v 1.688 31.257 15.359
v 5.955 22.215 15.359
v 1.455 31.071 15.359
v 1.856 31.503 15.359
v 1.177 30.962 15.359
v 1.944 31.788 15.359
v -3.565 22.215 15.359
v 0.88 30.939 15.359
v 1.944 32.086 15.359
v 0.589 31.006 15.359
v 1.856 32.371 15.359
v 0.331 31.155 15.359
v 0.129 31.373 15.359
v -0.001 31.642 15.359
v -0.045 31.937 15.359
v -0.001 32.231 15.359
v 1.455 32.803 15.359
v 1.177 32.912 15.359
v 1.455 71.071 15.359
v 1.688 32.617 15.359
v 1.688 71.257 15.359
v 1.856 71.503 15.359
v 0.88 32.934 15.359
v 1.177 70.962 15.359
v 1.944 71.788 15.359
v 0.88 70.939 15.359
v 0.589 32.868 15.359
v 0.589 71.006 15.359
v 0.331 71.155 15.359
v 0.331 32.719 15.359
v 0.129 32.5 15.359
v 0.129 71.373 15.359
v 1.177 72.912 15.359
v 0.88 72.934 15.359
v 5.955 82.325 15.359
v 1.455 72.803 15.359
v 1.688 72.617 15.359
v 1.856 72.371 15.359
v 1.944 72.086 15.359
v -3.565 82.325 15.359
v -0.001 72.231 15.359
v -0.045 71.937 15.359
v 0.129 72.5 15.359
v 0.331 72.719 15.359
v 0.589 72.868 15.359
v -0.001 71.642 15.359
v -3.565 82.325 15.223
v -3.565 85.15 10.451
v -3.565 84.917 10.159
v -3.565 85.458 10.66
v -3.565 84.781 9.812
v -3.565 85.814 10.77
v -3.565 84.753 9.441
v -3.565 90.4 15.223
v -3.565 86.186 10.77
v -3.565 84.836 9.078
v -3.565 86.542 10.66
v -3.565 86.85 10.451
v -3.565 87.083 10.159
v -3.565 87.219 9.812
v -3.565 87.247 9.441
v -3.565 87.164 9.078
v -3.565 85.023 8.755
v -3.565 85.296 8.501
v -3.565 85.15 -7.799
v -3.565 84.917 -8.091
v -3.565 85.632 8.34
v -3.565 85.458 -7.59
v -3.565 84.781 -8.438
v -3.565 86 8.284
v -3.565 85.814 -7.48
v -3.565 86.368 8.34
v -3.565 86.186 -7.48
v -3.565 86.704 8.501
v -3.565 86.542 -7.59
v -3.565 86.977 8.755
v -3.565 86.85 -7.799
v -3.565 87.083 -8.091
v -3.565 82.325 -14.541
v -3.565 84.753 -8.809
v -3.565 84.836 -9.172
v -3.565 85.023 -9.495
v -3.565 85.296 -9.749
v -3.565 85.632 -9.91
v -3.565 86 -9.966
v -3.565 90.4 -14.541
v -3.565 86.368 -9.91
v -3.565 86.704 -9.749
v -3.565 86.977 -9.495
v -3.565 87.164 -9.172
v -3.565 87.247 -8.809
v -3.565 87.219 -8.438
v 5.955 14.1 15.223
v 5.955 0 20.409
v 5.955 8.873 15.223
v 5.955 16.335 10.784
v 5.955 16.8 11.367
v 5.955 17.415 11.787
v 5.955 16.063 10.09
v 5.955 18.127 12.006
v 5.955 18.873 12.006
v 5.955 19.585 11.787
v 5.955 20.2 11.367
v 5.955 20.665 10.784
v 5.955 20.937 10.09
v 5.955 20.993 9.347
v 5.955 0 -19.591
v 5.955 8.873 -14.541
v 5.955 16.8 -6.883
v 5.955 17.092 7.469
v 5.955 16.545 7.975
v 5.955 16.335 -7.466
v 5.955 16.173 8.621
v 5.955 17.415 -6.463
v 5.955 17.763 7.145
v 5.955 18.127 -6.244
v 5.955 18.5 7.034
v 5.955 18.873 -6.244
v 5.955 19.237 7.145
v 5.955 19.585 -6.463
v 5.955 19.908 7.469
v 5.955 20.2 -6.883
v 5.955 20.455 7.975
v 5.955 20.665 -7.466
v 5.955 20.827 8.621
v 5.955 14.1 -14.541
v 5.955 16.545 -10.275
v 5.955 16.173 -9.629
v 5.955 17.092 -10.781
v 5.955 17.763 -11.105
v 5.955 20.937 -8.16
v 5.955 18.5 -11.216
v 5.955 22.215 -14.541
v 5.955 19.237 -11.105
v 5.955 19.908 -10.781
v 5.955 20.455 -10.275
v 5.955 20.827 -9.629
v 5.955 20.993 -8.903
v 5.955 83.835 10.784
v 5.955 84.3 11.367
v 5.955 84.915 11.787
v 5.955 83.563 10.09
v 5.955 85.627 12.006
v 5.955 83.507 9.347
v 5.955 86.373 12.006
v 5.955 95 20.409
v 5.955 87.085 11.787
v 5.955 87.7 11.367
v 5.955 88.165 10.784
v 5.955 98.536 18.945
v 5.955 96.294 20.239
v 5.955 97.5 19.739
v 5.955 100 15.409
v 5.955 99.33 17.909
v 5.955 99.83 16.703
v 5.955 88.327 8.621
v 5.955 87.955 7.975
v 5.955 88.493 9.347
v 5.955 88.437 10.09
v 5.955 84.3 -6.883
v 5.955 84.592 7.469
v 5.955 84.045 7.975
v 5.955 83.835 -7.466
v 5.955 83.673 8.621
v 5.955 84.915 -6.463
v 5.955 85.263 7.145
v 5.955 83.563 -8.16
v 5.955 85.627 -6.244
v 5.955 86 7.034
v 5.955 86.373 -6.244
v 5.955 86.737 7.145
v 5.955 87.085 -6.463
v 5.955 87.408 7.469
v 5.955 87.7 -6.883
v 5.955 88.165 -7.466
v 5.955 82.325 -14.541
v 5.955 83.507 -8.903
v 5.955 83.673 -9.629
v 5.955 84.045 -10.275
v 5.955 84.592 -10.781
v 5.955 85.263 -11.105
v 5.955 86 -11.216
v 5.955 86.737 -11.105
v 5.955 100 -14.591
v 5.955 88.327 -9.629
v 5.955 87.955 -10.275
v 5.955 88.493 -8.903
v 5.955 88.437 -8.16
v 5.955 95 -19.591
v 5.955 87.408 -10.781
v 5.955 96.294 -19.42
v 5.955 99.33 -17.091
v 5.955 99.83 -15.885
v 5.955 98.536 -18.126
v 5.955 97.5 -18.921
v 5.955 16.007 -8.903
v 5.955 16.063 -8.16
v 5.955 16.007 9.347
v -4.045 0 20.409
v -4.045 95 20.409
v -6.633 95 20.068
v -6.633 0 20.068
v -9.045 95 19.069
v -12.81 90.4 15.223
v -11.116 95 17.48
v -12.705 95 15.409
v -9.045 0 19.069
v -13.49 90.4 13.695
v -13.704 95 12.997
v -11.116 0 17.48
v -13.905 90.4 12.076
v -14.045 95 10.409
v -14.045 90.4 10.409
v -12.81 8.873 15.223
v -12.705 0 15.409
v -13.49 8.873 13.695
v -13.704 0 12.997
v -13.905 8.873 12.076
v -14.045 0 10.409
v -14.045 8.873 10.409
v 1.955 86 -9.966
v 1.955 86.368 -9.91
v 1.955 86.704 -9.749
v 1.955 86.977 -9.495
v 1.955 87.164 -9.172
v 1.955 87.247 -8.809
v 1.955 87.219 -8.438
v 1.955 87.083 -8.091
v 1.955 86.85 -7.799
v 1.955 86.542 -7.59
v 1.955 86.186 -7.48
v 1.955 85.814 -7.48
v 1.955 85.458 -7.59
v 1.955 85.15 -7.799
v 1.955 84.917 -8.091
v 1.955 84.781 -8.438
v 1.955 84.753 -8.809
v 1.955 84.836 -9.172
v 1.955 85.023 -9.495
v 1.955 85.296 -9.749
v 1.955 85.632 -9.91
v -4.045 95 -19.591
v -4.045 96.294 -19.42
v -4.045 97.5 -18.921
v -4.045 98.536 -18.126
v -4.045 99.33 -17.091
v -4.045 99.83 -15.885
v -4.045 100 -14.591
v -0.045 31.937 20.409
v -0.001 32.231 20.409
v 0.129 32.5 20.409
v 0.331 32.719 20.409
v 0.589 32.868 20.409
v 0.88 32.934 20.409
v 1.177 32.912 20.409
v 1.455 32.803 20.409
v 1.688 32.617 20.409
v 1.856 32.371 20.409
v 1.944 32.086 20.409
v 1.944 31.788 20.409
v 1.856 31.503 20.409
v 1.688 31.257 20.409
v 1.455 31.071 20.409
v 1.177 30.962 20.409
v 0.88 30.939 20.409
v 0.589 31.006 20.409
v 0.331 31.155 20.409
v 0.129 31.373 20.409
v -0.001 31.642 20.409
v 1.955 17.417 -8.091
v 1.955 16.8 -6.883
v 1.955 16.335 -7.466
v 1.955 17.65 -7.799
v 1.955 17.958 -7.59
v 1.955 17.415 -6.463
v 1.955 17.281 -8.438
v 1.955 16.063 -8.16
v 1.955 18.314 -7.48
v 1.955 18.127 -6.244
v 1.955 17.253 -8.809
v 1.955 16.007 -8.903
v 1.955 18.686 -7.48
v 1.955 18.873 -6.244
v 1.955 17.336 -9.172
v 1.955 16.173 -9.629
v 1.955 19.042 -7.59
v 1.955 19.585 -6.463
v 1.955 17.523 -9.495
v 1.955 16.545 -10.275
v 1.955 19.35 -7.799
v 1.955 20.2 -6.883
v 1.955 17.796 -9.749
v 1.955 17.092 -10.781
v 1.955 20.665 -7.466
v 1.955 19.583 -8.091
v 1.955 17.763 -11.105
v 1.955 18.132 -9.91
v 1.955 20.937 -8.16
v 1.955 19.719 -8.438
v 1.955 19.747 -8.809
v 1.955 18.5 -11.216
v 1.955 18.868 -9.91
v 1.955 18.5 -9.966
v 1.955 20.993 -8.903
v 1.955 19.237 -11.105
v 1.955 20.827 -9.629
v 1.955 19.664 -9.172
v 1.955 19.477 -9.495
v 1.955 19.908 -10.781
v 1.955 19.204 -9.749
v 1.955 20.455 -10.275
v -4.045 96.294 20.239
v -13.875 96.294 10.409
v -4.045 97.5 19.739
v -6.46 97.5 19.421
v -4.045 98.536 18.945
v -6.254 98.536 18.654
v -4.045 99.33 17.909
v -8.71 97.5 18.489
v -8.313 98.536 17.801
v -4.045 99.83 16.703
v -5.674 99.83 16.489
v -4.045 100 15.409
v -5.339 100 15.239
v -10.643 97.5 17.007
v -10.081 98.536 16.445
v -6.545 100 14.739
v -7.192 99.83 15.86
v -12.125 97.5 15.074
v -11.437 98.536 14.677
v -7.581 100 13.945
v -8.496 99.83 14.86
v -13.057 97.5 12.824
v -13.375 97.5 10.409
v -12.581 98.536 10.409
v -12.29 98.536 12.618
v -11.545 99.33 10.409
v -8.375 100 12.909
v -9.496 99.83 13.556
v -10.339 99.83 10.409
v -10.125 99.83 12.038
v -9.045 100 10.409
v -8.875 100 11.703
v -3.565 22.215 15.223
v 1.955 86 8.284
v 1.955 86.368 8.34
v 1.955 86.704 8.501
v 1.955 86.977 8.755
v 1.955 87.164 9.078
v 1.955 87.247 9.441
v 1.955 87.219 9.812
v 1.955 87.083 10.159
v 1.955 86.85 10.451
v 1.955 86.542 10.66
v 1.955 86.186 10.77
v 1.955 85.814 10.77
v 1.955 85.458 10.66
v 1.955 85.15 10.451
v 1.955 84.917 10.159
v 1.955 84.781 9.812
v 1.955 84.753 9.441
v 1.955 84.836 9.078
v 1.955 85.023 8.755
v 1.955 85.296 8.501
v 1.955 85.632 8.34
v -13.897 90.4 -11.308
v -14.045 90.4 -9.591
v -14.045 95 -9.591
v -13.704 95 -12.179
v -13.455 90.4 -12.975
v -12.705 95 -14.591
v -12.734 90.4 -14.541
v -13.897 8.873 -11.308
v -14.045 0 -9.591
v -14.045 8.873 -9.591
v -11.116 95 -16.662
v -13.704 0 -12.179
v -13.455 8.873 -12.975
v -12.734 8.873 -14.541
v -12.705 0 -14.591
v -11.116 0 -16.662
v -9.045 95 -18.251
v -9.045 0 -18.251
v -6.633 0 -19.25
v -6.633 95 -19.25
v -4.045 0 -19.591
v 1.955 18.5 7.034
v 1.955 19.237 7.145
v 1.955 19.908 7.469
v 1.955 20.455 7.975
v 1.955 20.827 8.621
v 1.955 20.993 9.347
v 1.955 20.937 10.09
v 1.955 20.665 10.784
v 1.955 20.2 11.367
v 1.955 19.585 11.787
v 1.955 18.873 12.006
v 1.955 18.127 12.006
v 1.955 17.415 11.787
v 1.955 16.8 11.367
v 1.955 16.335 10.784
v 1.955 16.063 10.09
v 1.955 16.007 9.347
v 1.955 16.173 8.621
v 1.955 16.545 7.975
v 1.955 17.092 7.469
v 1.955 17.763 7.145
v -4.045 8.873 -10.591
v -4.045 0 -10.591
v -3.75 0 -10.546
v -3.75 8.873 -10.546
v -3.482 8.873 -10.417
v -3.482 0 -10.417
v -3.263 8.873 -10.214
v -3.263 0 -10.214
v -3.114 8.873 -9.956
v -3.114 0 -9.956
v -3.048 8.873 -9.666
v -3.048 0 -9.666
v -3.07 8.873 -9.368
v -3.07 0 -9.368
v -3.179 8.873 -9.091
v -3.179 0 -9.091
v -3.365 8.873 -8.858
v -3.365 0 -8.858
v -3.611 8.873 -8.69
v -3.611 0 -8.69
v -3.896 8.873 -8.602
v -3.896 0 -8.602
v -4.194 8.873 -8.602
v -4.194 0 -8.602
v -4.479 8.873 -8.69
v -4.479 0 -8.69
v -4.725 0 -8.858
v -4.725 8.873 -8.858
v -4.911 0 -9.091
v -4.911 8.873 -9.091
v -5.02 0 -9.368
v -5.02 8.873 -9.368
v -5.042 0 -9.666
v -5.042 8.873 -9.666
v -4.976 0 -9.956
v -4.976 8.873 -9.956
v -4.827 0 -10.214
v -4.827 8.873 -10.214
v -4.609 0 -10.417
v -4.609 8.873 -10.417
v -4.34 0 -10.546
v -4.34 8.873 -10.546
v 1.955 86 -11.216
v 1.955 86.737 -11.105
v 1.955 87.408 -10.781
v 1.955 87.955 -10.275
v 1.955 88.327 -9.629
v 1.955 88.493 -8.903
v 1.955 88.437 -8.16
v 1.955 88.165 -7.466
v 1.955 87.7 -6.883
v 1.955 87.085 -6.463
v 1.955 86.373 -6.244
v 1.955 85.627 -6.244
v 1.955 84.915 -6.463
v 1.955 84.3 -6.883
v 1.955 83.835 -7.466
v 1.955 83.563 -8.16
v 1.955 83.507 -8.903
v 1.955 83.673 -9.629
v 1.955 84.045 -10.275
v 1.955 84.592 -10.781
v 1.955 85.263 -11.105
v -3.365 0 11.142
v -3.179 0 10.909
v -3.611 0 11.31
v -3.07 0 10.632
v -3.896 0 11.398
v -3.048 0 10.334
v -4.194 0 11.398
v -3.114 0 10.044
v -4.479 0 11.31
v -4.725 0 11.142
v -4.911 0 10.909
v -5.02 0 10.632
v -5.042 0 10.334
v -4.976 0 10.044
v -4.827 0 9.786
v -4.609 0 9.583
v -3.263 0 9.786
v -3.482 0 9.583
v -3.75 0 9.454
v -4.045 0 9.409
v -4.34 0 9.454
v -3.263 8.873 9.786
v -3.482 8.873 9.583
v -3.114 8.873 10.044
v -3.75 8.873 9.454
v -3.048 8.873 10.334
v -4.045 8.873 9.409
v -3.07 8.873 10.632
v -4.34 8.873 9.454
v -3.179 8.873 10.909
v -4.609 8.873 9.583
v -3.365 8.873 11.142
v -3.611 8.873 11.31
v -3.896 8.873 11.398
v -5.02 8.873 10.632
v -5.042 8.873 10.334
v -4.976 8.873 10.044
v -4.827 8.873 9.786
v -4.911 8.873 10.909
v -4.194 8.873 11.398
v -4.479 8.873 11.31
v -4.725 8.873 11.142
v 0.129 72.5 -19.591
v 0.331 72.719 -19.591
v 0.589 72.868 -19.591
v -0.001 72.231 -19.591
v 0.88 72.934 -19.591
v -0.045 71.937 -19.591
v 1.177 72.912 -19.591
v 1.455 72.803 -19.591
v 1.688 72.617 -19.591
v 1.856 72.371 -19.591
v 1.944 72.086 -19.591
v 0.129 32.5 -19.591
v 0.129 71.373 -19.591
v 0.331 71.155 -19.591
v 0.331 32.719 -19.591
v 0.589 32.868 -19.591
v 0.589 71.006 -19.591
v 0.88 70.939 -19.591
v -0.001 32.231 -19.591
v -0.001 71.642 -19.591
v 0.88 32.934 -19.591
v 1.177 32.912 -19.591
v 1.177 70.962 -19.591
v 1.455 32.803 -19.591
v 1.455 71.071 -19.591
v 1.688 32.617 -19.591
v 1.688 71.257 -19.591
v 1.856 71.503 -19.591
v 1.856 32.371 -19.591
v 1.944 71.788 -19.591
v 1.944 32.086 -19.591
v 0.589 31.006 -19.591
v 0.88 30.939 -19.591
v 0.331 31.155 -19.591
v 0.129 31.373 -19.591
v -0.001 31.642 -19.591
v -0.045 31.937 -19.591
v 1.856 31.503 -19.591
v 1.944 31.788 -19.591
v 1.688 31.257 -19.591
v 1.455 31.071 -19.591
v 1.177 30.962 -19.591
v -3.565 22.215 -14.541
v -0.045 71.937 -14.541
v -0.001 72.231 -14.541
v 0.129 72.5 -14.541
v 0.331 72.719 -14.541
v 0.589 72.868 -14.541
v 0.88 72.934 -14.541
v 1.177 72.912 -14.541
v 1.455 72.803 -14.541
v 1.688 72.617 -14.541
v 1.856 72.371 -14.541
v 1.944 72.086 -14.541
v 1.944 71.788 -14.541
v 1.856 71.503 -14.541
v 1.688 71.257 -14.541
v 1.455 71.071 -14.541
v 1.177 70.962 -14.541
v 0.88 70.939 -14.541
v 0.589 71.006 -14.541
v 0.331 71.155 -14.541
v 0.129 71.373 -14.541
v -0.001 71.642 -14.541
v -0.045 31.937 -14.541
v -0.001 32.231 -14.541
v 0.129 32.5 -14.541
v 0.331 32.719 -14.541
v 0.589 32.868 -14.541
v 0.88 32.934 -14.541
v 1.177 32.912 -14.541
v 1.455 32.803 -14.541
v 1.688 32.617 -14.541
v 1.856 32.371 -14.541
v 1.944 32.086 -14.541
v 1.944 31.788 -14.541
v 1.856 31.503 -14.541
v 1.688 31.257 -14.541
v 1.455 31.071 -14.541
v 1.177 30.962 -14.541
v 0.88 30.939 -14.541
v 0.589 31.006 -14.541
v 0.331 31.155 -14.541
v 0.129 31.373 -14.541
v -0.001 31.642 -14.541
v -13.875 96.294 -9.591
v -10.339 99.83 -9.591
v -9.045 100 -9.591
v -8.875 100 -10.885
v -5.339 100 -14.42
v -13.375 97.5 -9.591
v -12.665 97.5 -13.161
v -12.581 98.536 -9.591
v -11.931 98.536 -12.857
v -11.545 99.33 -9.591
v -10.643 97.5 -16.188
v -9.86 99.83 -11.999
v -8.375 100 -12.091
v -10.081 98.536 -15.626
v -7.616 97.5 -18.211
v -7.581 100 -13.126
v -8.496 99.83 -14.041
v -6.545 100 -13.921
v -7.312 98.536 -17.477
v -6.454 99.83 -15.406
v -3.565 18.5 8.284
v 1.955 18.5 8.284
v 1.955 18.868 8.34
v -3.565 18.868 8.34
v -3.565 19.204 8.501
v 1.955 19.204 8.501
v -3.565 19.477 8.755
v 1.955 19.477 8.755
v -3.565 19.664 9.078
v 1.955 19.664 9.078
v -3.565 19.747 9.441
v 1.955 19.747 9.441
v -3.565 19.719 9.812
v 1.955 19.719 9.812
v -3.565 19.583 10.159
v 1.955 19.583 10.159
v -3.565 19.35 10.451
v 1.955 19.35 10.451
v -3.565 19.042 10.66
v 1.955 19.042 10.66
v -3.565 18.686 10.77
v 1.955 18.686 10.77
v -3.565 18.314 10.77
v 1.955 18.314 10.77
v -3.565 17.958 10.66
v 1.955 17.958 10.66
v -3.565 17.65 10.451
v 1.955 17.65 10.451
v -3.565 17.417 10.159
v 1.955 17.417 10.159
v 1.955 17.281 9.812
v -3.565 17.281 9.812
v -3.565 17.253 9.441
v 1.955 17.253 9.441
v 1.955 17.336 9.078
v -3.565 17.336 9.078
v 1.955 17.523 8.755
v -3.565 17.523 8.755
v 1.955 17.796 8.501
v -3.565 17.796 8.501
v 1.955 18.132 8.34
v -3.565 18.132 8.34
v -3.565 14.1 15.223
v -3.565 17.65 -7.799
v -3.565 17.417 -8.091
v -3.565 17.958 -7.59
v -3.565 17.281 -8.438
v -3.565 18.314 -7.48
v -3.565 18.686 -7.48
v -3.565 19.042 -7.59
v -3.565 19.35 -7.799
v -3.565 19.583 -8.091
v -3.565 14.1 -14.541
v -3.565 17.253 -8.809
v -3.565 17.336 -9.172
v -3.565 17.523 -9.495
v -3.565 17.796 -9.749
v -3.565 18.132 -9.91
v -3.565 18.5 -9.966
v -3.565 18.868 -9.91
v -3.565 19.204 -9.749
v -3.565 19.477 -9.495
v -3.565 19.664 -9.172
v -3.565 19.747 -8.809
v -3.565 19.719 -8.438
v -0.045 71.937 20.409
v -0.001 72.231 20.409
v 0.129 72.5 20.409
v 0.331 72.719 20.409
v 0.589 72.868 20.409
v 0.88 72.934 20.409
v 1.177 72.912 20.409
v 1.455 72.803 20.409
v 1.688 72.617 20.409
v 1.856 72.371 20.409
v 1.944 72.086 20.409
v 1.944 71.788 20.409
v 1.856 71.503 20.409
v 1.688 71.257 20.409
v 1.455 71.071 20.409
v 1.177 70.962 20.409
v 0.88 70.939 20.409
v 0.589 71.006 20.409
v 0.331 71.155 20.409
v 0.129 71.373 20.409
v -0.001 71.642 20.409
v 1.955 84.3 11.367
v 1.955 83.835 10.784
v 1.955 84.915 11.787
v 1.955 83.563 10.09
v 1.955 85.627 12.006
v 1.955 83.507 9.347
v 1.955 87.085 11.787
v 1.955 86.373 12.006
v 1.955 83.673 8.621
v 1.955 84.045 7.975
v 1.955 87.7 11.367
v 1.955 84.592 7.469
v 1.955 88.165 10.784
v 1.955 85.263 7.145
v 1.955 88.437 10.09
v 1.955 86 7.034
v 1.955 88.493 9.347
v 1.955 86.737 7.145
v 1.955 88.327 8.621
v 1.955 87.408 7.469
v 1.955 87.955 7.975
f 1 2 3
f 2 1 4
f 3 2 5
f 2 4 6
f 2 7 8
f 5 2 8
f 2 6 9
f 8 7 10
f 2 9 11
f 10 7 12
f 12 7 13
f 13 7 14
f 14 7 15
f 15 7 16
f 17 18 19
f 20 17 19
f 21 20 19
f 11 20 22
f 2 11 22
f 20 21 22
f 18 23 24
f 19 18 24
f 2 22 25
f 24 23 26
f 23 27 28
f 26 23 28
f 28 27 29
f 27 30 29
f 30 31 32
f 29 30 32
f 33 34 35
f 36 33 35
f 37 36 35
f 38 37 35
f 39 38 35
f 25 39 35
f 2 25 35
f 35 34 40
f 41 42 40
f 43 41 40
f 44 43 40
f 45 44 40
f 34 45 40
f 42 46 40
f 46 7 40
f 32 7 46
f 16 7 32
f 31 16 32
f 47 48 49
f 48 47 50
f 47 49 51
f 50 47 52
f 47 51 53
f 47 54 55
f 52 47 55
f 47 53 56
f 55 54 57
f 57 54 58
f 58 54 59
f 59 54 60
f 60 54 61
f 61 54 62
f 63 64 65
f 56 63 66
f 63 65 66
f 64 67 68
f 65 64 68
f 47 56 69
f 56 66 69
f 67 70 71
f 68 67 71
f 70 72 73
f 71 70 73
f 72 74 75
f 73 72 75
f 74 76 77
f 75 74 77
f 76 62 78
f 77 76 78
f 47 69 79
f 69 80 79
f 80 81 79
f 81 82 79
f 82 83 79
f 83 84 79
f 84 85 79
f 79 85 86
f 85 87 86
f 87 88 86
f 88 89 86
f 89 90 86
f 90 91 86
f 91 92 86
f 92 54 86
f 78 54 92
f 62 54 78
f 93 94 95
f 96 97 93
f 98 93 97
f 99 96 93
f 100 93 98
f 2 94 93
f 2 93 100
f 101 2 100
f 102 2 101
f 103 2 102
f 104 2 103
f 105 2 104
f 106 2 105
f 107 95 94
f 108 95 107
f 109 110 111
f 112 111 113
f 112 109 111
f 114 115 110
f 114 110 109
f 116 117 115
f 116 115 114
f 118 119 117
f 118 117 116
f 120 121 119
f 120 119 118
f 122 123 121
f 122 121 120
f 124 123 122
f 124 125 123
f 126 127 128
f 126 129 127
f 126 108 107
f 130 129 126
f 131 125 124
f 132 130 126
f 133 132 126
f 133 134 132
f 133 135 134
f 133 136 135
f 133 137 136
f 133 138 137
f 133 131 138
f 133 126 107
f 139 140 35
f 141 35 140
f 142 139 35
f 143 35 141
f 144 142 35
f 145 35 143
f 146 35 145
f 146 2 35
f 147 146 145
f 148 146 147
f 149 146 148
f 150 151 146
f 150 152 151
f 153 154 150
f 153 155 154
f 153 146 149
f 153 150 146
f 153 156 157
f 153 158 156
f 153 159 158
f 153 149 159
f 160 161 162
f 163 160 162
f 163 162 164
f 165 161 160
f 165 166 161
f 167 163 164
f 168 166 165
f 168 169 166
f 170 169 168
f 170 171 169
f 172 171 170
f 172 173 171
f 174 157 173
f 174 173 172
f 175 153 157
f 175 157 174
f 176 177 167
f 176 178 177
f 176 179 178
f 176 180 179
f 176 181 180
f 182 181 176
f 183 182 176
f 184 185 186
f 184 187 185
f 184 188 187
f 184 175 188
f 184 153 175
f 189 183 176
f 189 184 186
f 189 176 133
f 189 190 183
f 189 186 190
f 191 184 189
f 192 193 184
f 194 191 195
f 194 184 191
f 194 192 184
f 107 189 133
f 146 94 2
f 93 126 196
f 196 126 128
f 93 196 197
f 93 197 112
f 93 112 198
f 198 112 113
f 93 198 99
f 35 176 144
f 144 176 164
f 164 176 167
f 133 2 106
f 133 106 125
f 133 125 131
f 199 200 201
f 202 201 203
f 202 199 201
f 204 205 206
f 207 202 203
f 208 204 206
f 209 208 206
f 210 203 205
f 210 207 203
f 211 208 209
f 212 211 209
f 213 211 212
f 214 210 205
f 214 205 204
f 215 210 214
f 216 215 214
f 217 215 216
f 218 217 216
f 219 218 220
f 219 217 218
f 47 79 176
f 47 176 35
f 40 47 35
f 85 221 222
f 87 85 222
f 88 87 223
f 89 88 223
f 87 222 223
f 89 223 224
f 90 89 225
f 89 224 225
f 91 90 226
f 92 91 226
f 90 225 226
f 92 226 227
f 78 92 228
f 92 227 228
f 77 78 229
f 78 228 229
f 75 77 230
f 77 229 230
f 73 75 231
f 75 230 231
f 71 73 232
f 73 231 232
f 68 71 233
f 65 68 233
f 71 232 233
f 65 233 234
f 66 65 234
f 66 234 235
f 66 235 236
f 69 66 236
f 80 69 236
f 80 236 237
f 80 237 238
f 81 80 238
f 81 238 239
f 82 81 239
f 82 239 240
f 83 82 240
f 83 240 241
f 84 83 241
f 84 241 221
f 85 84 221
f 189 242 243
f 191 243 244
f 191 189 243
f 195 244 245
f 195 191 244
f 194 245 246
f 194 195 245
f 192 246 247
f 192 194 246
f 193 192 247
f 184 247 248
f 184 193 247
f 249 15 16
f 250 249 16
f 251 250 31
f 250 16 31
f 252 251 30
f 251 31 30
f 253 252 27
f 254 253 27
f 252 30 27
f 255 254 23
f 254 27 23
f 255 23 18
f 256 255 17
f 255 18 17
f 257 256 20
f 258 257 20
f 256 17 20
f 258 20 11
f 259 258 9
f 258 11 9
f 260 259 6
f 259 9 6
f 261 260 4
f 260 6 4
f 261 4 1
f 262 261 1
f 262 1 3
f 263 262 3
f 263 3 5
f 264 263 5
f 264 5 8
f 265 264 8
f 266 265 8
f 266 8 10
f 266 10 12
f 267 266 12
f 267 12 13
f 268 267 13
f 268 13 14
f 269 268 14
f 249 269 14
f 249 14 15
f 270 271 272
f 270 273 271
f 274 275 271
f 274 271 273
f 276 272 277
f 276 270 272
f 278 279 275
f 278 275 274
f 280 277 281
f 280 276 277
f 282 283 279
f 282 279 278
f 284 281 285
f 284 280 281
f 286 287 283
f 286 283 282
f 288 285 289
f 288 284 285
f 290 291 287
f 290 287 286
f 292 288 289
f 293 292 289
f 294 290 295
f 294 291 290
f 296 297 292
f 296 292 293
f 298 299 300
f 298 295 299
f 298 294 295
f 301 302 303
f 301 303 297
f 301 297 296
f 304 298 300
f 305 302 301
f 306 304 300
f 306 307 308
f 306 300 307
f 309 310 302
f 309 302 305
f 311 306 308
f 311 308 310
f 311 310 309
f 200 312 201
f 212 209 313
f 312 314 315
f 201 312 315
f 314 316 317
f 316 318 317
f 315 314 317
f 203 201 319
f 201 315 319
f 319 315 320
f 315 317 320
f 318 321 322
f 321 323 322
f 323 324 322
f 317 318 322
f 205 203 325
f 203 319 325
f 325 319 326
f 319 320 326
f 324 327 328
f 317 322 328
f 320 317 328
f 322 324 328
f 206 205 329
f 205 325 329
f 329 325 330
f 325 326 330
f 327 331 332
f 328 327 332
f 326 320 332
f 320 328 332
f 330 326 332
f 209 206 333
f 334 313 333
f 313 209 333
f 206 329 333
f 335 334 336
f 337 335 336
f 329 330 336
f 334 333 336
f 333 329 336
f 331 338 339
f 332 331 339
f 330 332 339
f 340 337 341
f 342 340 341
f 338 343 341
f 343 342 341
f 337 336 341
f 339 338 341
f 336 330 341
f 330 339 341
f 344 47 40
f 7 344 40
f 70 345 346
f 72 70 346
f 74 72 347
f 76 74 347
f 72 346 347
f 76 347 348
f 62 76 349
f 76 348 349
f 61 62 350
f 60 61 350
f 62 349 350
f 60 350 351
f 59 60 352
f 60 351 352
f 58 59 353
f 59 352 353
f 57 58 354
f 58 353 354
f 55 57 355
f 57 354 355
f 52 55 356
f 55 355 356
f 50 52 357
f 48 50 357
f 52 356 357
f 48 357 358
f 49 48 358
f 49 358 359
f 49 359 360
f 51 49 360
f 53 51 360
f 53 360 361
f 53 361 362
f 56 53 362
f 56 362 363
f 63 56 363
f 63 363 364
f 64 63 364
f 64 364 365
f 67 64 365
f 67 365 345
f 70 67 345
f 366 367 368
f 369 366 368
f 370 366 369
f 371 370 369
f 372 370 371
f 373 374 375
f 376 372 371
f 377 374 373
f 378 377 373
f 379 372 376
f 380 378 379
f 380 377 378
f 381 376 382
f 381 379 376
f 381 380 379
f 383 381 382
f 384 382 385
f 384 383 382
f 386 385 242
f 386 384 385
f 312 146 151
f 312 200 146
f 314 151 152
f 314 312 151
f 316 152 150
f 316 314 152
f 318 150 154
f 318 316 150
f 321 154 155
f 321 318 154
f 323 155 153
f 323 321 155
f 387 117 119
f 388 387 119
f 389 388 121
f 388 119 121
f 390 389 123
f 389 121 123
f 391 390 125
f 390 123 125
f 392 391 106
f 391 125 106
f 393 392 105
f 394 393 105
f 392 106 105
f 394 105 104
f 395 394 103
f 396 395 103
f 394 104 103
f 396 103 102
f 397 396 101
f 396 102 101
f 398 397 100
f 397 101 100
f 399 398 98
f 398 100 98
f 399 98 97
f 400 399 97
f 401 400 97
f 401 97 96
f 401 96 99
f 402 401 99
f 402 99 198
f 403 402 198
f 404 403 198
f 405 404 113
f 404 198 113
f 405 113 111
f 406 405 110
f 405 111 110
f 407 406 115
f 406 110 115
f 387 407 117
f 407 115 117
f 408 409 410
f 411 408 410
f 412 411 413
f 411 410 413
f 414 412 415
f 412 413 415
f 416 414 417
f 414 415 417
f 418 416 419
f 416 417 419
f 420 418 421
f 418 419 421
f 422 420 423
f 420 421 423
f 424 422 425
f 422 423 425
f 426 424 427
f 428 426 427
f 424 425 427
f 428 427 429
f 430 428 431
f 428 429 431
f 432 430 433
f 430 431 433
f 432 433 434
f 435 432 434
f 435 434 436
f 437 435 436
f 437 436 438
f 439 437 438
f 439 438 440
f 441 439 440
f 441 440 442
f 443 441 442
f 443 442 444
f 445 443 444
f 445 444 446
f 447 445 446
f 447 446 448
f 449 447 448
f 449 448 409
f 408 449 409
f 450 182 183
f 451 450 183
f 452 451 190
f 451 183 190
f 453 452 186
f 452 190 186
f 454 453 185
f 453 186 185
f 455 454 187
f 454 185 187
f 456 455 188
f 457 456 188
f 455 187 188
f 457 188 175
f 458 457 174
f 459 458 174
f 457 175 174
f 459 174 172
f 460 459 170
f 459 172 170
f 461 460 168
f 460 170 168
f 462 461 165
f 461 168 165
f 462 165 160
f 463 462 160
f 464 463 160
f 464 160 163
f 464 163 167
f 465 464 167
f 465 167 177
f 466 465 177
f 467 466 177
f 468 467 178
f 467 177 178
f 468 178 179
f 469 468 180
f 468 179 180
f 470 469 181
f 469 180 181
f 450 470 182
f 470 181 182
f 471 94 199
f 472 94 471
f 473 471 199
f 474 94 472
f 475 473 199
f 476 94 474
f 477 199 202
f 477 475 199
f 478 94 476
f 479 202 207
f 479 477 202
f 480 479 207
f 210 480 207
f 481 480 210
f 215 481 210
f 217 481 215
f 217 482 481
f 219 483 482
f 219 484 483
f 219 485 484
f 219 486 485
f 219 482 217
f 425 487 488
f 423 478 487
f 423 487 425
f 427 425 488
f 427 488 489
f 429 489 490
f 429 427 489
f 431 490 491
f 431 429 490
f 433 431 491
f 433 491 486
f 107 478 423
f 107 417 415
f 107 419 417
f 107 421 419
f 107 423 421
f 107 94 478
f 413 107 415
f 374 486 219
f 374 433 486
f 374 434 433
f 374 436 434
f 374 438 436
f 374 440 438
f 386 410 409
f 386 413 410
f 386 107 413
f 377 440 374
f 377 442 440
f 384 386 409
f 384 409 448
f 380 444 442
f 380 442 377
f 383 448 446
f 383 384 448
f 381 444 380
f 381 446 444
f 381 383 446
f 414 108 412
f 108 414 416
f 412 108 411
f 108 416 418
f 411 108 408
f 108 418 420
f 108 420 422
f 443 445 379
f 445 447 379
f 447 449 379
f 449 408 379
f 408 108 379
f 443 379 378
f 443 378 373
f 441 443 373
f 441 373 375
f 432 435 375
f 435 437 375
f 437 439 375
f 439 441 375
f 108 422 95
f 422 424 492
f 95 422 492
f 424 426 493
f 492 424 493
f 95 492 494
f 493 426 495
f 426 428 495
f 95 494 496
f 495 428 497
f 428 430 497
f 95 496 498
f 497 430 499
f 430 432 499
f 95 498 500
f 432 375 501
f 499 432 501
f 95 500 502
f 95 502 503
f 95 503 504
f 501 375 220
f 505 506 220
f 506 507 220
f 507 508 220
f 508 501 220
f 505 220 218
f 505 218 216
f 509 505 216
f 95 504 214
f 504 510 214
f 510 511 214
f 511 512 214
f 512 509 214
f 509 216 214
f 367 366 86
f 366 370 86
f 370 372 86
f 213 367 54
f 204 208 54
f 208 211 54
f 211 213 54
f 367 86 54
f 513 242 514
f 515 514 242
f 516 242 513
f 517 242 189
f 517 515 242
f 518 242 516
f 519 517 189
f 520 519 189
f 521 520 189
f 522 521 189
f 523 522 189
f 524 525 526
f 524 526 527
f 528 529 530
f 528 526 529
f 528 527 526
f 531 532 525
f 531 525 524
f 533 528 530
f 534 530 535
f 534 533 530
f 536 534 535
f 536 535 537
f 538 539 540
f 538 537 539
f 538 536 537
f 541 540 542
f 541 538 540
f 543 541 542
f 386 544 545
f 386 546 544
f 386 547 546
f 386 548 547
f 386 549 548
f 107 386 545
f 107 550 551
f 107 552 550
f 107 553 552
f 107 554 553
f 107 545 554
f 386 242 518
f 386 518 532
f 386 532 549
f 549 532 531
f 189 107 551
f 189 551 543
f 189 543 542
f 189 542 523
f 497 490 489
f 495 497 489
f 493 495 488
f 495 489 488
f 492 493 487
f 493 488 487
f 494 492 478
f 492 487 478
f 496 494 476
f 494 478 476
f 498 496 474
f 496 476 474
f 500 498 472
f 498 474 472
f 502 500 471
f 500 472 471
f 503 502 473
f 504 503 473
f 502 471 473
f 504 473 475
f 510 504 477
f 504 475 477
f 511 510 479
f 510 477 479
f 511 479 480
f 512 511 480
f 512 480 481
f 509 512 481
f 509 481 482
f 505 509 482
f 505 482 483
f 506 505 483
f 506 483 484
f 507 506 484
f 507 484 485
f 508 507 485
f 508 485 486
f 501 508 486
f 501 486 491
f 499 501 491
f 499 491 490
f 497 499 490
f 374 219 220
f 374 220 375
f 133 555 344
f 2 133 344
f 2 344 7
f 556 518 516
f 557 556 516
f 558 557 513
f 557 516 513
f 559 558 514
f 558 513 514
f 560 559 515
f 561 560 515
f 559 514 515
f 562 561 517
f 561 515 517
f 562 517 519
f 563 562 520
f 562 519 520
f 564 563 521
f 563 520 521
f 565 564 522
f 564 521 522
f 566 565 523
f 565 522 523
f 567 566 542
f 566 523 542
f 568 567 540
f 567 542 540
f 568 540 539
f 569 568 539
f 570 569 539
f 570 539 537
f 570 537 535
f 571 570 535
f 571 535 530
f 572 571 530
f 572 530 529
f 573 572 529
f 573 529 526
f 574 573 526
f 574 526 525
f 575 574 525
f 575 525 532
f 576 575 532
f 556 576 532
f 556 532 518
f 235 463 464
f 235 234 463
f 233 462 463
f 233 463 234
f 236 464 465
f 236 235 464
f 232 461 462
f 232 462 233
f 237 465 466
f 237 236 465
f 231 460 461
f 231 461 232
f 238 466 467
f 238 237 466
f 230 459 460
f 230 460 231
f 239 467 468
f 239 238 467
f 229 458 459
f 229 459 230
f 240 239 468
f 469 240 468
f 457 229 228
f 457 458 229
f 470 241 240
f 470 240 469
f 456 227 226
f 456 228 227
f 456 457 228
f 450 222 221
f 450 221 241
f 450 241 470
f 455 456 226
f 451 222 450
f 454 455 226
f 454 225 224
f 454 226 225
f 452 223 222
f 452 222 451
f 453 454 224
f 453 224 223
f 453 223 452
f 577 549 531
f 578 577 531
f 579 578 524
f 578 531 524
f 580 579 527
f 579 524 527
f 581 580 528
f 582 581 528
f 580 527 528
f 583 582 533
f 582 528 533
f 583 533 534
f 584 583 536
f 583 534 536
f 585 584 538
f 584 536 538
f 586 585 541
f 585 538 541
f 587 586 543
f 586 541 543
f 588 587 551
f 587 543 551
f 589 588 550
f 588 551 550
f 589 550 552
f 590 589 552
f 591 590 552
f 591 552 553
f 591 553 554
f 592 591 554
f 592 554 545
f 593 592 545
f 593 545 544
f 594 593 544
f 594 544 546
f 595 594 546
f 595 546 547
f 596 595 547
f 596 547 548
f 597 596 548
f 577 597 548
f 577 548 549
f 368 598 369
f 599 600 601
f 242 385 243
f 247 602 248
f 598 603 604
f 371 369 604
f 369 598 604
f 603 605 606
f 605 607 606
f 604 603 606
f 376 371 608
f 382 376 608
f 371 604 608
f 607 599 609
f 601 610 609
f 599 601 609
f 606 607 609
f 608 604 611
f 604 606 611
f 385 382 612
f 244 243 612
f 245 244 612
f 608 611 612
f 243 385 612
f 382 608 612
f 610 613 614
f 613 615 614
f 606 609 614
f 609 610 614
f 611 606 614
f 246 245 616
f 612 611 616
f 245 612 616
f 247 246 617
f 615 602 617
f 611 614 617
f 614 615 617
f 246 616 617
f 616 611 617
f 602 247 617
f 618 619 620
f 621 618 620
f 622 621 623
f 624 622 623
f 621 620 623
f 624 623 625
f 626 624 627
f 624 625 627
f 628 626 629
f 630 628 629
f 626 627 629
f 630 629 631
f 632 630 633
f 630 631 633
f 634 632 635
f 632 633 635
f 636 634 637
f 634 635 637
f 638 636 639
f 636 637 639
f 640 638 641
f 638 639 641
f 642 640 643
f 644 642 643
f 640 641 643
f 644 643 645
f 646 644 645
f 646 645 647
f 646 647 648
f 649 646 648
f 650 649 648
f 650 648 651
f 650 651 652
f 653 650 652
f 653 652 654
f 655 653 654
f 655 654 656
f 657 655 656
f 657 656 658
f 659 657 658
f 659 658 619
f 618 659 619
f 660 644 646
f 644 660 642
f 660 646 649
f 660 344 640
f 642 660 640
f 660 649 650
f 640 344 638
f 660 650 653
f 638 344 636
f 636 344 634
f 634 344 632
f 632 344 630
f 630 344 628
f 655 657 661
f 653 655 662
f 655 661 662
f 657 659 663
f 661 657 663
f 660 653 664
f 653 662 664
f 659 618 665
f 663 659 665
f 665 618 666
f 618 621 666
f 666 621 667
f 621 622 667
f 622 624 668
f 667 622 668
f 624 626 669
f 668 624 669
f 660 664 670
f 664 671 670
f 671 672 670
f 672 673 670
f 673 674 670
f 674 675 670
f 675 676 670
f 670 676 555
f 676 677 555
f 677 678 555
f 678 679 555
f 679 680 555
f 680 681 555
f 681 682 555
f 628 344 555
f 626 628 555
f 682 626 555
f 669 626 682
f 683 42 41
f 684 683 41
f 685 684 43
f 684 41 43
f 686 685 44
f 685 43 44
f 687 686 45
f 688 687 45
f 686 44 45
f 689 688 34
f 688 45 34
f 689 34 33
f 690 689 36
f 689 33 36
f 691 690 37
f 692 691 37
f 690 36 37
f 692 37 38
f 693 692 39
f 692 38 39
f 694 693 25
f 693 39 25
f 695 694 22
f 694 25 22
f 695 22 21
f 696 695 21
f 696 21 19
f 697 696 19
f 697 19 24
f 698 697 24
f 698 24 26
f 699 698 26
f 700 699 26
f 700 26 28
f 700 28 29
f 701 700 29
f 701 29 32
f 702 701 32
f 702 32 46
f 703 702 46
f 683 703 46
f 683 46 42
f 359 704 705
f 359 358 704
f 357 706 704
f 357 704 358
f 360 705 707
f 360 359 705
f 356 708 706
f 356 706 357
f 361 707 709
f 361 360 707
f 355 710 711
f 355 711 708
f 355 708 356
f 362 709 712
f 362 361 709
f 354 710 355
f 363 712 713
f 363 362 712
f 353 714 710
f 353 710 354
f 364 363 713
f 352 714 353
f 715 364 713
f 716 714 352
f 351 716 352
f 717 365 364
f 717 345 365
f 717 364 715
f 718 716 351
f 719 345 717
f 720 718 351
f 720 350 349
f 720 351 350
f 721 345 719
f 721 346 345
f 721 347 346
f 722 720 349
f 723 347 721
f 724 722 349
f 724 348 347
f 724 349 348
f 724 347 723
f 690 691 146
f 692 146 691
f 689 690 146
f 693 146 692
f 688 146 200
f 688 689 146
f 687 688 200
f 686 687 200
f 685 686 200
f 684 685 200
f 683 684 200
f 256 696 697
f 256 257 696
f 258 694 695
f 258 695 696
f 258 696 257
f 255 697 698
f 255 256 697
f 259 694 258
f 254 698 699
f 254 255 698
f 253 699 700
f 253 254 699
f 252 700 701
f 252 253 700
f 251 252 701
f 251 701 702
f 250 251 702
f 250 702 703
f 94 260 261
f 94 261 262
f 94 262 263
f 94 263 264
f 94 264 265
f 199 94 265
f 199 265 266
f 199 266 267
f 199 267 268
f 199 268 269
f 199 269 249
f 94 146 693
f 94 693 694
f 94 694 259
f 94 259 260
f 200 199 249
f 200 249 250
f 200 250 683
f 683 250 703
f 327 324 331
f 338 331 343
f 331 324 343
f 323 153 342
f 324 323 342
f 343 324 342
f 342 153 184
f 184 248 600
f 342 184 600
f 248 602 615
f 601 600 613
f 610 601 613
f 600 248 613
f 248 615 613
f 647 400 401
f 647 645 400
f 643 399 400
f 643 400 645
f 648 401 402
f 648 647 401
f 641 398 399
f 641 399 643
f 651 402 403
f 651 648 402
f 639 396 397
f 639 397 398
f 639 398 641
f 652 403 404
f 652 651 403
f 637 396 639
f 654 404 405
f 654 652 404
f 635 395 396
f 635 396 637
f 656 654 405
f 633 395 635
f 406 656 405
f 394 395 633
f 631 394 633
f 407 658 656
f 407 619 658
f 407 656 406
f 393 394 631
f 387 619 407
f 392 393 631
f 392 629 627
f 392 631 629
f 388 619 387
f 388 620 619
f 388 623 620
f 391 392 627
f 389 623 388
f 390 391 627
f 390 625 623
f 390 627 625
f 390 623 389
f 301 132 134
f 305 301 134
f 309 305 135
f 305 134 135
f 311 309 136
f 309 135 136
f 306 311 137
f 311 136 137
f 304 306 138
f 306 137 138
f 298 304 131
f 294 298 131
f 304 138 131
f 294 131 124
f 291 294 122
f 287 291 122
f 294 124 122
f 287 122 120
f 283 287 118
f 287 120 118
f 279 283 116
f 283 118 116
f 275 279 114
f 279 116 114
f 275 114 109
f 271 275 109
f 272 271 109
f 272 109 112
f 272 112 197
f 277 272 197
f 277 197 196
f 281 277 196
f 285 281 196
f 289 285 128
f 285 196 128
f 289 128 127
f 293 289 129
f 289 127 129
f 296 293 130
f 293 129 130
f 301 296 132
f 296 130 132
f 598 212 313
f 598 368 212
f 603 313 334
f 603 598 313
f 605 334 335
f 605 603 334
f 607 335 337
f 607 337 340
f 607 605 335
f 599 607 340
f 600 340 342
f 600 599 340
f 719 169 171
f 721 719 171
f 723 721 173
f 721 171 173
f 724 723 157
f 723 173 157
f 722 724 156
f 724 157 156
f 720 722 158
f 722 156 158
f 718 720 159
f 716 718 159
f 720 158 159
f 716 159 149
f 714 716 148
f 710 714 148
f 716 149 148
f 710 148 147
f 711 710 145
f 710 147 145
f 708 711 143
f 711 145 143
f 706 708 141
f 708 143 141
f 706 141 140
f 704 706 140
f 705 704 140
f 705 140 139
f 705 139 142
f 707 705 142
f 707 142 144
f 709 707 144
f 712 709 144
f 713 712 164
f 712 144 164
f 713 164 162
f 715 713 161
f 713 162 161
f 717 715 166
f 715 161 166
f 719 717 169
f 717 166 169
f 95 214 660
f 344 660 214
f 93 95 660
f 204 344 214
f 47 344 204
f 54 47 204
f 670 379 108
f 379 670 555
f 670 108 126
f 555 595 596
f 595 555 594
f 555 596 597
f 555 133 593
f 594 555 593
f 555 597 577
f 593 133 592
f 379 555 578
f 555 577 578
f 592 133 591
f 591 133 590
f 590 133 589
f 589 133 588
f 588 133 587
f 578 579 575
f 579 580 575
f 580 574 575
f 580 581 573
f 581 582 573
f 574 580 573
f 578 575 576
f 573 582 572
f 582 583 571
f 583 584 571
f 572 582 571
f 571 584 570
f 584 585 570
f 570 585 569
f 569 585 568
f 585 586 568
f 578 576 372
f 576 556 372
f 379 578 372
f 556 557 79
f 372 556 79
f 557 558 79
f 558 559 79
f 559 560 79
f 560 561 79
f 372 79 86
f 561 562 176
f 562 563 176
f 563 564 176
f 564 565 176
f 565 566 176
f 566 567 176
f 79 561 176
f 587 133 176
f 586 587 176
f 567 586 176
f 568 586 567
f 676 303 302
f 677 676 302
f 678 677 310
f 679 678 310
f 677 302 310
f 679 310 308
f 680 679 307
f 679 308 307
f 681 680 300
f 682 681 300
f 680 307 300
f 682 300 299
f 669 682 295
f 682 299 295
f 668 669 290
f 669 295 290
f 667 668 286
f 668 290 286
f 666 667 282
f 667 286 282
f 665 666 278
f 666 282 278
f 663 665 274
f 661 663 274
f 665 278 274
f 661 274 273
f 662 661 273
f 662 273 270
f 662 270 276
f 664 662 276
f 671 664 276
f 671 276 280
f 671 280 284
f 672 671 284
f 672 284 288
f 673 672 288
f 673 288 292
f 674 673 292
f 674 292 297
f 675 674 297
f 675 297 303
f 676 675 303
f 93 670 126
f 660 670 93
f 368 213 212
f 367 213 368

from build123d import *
from build123d.topology import SkipClean

# Parameters (mm, degrees)
BOSS_EXTRUDE1_DEPTH = 100
SKETCH11_W          = 29.1
SKETCH11_H          = 75.5
CUT_EXTRUDE1_DEPTH  = 11.2
SKETCH13_R          = 4.4
CUT_EXTRUDE5_DEPTH  = 22.2
FILLET1_R           = 5
SKETCH14_W          = 29.1
SKETCH14_H          = 8.115
SKETCH14_R          = 2.75
SKETCH14_H_2        = 8.075
BOSS_EXTRUDE2_DEPTH = 0.72
SKETCH15_R          = 2.75
SKETCH15_R_2        = 1.25
BOSS_EXTRUDE3_DEPTH = 9.52
SKETCH16_R          = 2.5
CUT_EXTRUDE6_DEPTH  = 4
SKETCH17_W          = 29.764027379
SKETCH17_H          = 76.3
SKETCH17_W_2        = 28.964027379
SKETCH17_H_2        = 75.5
CUT_EXTRUDE7_DEPTH  = 44
SKETCH18_W          = 29.9
SKETCH18_H          = 60.11
SKETCH18_W_2        = 29.1
SKETCH18_H_2        = 59.31
CUT_EXTRUDE8_DEPTH  = 44
SKETCH19_W          = 29.764027379
SKETCH19_H          = 5.226630125
CUT_EXTRUDE9_DEPTH  = 44
SKETCH21_R          = 1
CUT_EXTRUDE10_DEPTH = 122.5
SKETCH22_R          = 1
CUT_EXTRUDE11_DEPTH = 10.5


with BuildPart() as part:
    # Sketch1 → Boss-Extrude1 (new body)
    with BuildSketch(Plane(origin=(0, 0, 0), x_dir=(1, 0, 0), z_dir=(0, 1, 0))):
        with BuildLine():
            Line((-4.0452326, 19.590813971), (5.9547674, 19.590813971))
            Line((5.9547674, 19.590813971), (5.9547674, -0.409186029))
            Line((5.9547674, -0.409186029), (5.9547674, -20.409186029))
            Line((5.9547674, -20.409186029), (-4.0452326, -20.409186029))
            ThreePointArc((-4.0452326, -20.409186029), (-11.116300412, -17.48025384), (-14.0452326, -10.409186029))
            Line((-14.0452326, -10.409186029), (-14.0452326, 9.590813971))
            ThreePointArc((-14.0452326, 9.590813971), (-11.116300412, 16.661881783), (-4.0452326, 19.590813971))
        make_face()
    extrude(amount=BOSS_EXTRUDE1_DEPTH)

    # Sketch11 → Cut-Extrude1 (cut)
    with BuildSketch(Plane.ZY.offset(14.0452326)):
        with Locations((0.409186029, 52.25)):
            Rectangle(SKETCH11_W, SKETCH11_H)
    extrude(amount=-CUT_EXTRUDE1_DEPTH, mode=Mode.SUBTRACT)

    # Sketch13 → Cut-Extrude5 (cut)
    with BuildSketch(Plane.ZY.offset(2.8452326)):
        with BuildLine():
            ThreePointArc((12.284186029, 86), (11.93014617, 87.349768499), (10.959186029, 88.351993835))
            ThreePointArc((10.959186029, 88.351993835), (9.534186029, 88.75), (8.109186029, 88.351993835))
            ThreePointArc((8.109186029, 88.351993835), (8.18441753, 83.604039858), (12.284186029, 86))
        make_face()
        with BuildLine():
            ThreePointArc((-5.965813971, 86), (-6.31985383, 87.349768499), (-7.290813971, 88.351993835))
            ThreePointArc((-7.290813971, 88.351993835), (-8.715813971, 88.75), (-10.140813971, 88.351993835))
            ThreePointArc((-10.140813971, 88.351993835), (-10.06558247, 83.604039858), (-5.965813971, 86))
        make_face()
        Polygon((4.229186029, 22.615), (14.959186029, 22.615), (14.959186029, 38.515), (14.959186029, 80.015), (14.959186029, 81.925), (4.229186029, 81.925), (2.559186029, 81.925), (-1.740813971, 81.925), (-3.410813971, 81.925), (-14.140813971, 81.925), (-14.140813971, 80.015), (-14.140813971, 38.515), (-14.140813971, 22.615), (-3.410813971, 22.615), (-1.740813971, 22.615), (2.559186029, 22.615), align=None)
        Polygon((12.984186029, 43.815), (12.984186029, 38.515), (12.984186029, 24.115), (-12.165813971, 24.115), (-12.165813971, 38.515), (-12.165813971, 43.815), align=None, mode=Mode.SUBTRACT)
        with BuildLine():
            ThreePointArc((7.989888554, 59.032180934), (6.768483101, 52.645011162), (6.359186029, 46.155))
            Line((6.359186029, 46.155), (-5.540813971, 46.155))
            ThreePointArc((-5.540813971, 46.155), (-5.950111044, 52.645011162), (-7.171516497, 59.032180934))
            ThreePointArc((-7.171516497, 59.032180934), (-7.78796768, 60.755318567), (-8.708121769, 62.337257826))
            ThreePointArc((-8.708121769, 62.337257826), (-9.536012183, 73.954242881), (0.409186029, 80.015))
            ThreePointArc((0.409186029, 80.015), (10.35438424, 73.954242881), (9.526493826, 62.337257826))
            ThreePointArc((9.526493826, 62.337257826), (8.606339737, 60.755318567), (7.989888554, 59.032180934))
        make_face(mode=Mode.SUBTRACT)
        with BuildLine():
            ThreePointArc((9.526493826, 62.337257826), (10.35438424, 73.954242881), (0.409186029, 80.015))
            ThreePointArc((0.409186029, 80.015), (-9.536012183, 73.954242881), (-8.708121769, 62.337257826))
            ThreePointArc((-8.708121769, 62.337257826), (-7.78796768, 60.755318567), (-7.171516497, 59.032180934))
            ThreePointArc((-7.171516497, 59.032180934), (-5.950111044, 52.645011162), (-5.540813971, 46.155))
            Line((-5.540813971, 46.155), (6.359186029, 46.155))
            ThreePointArc((6.359186029, 46.155), (6.768483101, 52.645011162), (7.989888554, 59.032180934))
            ThreePointArc((7.989888554, 59.032180934), (8.606339737, 60.755318567), (9.526493826, 62.337257826))
        make_face()
        with Locations((0.409186029, 68.825)):
            Circle(SKETCH13_R, mode=Mode.SUBTRACT)
        with Locations((0.409186029, 68.825)):
            Circle(SKETCH13_R)
        Polygon((12.984186029, 43.815), (12.984186029, 38.515), (12.984186029, 24.115), (-12.165813971, 24.115), (-12.165813971, 38.515), (-12.165813971, 43.815), align=None)
        with BuildLine():
            ThreePointArc((8.109186029, 16.148006165), (9.534186029, 15.75), (10.959186029, 16.148006165))
            ThreePointArc((10.959186029, 16.148006165), (11.93014617, 17.150231501), (12.284186029, 18.5))
            ThreePointArc((12.284186029, 18.5), (8.18441753, 20.895960142), (8.109186029, 16.148006165))
        make_face()
        with BuildLine():
            ThreePointArc((-10.140813971, 16.148006165), (-8.715813971, 15.75), (-7.290813971, 16.148006165))
            ThreePointArc((-7.290813971, 16.148006165), (-6.31985383, 17.150231501), (-5.965813971, 18.5))
            ThreePointArc((-5.965813971, 18.5), (-10.06558247, 20.895960142), (-10.140813971, 16.148006165))
        make_face()
    extrude(amount=-CUT_EXTRUDE5_DEPTH, mode=Mode.SUBTRACT)

    # Fillet1
    fillet1_edges = [part.edges().sort_by_distance(p)[0] for p in [
        (-11.116300412, 100, -16.661881783),
        (-14.0452326, 100, 0.409186029),
        (-11.116300412, 100, 17.48025384),
        (0.9547674, 100, 20.409186029),
        (0.9547674, 100, -19.590813971),
    ]]
    fillet(fillet1_edges, radius=FILLET1_R)

    # Sketch14 → Boss-Extrude2 (add)
    with SkipClean():  # the faces are left unmerged after this step: merging them gives an invalid solid
        with BuildSketch(Plane.ZY.offset(2.8452326)):
            with Locations((0.409186029, 18.5575)):
                Rectangle(SKETCH14_W, SKETCH14_H)
            with Locations((9.534186029, 18.5)):
                Circle(SKETCH14_R, mode=Mode.SUBTRACT)
            with Locations((-8.715813971, 18.5)):
                Circle(SKETCH14_R, mode=Mode.SUBTRACT)
            with Locations((0.409186029, 85.9625)):
                Rectangle(SKETCH14_W, SKETCH14_H_2)
            with Locations((9.534186029, 86)):
                Circle(SKETCH14_R, mode=Mode.SUBTRACT)
            with Locations((-8.715813971, 86)):
                Circle(SKETCH14_R, mode=Mode.SUBTRACT)
        extrude(amount=BOSS_EXTRUDE2_DEPTH)

    # Sketch15 → Boss-Extrude3 (add)
    with BuildSketch(Plane(origin=(5.9547674, 0, 0), x_dir=(0, 0, -1), z_dir=(1, 0, 0))):
        with Locations((8.715813971, 18.5)):
            Circle(SKETCH15_R)
        with Locations((8.715813971, 18.5)):
            Circle(SKETCH15_R_2, mode=Mode.SUBTRACT)
        with Locations((-9.534186029, 18.5)):
            Circle(SKETCH15_R)
        with Locations((-9.534186029, 18.5)):
            Circle(SKETCH15_R_2, mode=Mode.SUBTRACT)
        with Locations((8.715813971, 86)):
            Circle(SKETCH15_R)
        with Locations((8.715813971, 86)):
            Circle(SKETCH15_R_2, mode=Mode.SUBTRACT)
        with Locations((-9.534186029, 86)):
            Circle(SKETCH15_R)
        with Locations((-9.534186029, 86)):
            Circle(SKETCH15_R_2, mode=Mode.SUBTRACT)
    extrude(amount=-BOSS_EXTRUDE3_DEPTH)

    # Sketch16 → Cut-Extrude6 (cut)
    with BuildSketch(Plane(origin=(5.9547674, 0, 0), x_dir=(0, 0, -1), z_dir=(1, 0, 0))):
        with Locations((-9.534186029, 18.5)):
            Circle(SKETCH16_R)
        with Locations((8.715813971, 18.5)):
            Circle(SKETCH16_R)
        with Locations((-9.534186029, 86)):
            Circle(SKETCH16_R)
        with Locations((8.715813971, 86)):
            Circle(SKETCH16_R)
    extrude(amount=-CUT_EXTRUDE6_DEPTH, mode=Mode.SUBTRACT)

    # Sketch17 → Cut-Extrude7 (cut)
    with BuildSketch(Plane.ZY.offset(3.5652326)):
        with Locations((0.341199719, 52.25)):
            Rectangle(SKETCH17_W, SKETCH17_H)
        with Locations((0.341199719, 52.25)):
            Rectangle(SKETCH17_W_2, SKETCH17_H_2, mode=Mode.SUBTRACT)
    extrude(amount=CUT_EXTRUDE7_DEPTH, mode=Mode.SUBTRACT)

    # Sketch18 → Cut-Extrude8 (cut)
    with BuildSketch(Plane.ZY.offset(3.5652326)):
        with Locations((0.409186029, 52.27)):
            Rectangle(SKETCH18_W, SKETCH18_H)
        with Locations((0.409186029, 52.27)):
            Rectangle(SKETCH18_W_2, SKETCH18_H_2, mode=Mode.SUBTRACT)
    extrude(amount=-CUT_EXTRUDE8_DEPTH, mode=Mode.SUBTRACT)

    # Sketch19 → Cut-Extrude9 (cut)
    with BuildSketch(Plane.ZY.offset(14.0452326)):
        with Locations((0.341199719, 11.486684938)):
            Rectangle(SKETCH19_W, SKETCH19_H)
    extrude(amount=-CUT_EXTRUDE9_DEPTH, mode=Mode.SUBTRACT)

    # Sketch21 → Cut-Extrude10 (cut)
    with BuildSketch(Plane(origin=(0, 0, -19.590813971), x_dir=(-1, 0, 0), z_dir=(0, 0, -1))):
        with Locations((-0.9547674, 71.936684938)):
            Circle(SKETCH21_R)
        with Locations((-0.9547674, 31.936684938)):
            Circle(SKETCH21_R)
    extrude(amount=-CUT_EXTRUDE10_DEPTH, mode=Mode.SUBTRACT)

    # Sketch22 → Cut-Extrude11 (cut)
    with BuildSketch(Plane.XZ):
        with Locations(Location((-4.0452326, -9.590813971, 0), (0, 0, 270))):
            Circle(SKETCH22_R)
        with Locations(Location((-4.0452326, 10.409186029, 0), (0, 0, 270))):
            Circle(SKETCH22_R)
    extrude(amount=-CUT_EXTRUDE11_DEPTH, mode=Mode.SUBTRACT)


solid = part.part
